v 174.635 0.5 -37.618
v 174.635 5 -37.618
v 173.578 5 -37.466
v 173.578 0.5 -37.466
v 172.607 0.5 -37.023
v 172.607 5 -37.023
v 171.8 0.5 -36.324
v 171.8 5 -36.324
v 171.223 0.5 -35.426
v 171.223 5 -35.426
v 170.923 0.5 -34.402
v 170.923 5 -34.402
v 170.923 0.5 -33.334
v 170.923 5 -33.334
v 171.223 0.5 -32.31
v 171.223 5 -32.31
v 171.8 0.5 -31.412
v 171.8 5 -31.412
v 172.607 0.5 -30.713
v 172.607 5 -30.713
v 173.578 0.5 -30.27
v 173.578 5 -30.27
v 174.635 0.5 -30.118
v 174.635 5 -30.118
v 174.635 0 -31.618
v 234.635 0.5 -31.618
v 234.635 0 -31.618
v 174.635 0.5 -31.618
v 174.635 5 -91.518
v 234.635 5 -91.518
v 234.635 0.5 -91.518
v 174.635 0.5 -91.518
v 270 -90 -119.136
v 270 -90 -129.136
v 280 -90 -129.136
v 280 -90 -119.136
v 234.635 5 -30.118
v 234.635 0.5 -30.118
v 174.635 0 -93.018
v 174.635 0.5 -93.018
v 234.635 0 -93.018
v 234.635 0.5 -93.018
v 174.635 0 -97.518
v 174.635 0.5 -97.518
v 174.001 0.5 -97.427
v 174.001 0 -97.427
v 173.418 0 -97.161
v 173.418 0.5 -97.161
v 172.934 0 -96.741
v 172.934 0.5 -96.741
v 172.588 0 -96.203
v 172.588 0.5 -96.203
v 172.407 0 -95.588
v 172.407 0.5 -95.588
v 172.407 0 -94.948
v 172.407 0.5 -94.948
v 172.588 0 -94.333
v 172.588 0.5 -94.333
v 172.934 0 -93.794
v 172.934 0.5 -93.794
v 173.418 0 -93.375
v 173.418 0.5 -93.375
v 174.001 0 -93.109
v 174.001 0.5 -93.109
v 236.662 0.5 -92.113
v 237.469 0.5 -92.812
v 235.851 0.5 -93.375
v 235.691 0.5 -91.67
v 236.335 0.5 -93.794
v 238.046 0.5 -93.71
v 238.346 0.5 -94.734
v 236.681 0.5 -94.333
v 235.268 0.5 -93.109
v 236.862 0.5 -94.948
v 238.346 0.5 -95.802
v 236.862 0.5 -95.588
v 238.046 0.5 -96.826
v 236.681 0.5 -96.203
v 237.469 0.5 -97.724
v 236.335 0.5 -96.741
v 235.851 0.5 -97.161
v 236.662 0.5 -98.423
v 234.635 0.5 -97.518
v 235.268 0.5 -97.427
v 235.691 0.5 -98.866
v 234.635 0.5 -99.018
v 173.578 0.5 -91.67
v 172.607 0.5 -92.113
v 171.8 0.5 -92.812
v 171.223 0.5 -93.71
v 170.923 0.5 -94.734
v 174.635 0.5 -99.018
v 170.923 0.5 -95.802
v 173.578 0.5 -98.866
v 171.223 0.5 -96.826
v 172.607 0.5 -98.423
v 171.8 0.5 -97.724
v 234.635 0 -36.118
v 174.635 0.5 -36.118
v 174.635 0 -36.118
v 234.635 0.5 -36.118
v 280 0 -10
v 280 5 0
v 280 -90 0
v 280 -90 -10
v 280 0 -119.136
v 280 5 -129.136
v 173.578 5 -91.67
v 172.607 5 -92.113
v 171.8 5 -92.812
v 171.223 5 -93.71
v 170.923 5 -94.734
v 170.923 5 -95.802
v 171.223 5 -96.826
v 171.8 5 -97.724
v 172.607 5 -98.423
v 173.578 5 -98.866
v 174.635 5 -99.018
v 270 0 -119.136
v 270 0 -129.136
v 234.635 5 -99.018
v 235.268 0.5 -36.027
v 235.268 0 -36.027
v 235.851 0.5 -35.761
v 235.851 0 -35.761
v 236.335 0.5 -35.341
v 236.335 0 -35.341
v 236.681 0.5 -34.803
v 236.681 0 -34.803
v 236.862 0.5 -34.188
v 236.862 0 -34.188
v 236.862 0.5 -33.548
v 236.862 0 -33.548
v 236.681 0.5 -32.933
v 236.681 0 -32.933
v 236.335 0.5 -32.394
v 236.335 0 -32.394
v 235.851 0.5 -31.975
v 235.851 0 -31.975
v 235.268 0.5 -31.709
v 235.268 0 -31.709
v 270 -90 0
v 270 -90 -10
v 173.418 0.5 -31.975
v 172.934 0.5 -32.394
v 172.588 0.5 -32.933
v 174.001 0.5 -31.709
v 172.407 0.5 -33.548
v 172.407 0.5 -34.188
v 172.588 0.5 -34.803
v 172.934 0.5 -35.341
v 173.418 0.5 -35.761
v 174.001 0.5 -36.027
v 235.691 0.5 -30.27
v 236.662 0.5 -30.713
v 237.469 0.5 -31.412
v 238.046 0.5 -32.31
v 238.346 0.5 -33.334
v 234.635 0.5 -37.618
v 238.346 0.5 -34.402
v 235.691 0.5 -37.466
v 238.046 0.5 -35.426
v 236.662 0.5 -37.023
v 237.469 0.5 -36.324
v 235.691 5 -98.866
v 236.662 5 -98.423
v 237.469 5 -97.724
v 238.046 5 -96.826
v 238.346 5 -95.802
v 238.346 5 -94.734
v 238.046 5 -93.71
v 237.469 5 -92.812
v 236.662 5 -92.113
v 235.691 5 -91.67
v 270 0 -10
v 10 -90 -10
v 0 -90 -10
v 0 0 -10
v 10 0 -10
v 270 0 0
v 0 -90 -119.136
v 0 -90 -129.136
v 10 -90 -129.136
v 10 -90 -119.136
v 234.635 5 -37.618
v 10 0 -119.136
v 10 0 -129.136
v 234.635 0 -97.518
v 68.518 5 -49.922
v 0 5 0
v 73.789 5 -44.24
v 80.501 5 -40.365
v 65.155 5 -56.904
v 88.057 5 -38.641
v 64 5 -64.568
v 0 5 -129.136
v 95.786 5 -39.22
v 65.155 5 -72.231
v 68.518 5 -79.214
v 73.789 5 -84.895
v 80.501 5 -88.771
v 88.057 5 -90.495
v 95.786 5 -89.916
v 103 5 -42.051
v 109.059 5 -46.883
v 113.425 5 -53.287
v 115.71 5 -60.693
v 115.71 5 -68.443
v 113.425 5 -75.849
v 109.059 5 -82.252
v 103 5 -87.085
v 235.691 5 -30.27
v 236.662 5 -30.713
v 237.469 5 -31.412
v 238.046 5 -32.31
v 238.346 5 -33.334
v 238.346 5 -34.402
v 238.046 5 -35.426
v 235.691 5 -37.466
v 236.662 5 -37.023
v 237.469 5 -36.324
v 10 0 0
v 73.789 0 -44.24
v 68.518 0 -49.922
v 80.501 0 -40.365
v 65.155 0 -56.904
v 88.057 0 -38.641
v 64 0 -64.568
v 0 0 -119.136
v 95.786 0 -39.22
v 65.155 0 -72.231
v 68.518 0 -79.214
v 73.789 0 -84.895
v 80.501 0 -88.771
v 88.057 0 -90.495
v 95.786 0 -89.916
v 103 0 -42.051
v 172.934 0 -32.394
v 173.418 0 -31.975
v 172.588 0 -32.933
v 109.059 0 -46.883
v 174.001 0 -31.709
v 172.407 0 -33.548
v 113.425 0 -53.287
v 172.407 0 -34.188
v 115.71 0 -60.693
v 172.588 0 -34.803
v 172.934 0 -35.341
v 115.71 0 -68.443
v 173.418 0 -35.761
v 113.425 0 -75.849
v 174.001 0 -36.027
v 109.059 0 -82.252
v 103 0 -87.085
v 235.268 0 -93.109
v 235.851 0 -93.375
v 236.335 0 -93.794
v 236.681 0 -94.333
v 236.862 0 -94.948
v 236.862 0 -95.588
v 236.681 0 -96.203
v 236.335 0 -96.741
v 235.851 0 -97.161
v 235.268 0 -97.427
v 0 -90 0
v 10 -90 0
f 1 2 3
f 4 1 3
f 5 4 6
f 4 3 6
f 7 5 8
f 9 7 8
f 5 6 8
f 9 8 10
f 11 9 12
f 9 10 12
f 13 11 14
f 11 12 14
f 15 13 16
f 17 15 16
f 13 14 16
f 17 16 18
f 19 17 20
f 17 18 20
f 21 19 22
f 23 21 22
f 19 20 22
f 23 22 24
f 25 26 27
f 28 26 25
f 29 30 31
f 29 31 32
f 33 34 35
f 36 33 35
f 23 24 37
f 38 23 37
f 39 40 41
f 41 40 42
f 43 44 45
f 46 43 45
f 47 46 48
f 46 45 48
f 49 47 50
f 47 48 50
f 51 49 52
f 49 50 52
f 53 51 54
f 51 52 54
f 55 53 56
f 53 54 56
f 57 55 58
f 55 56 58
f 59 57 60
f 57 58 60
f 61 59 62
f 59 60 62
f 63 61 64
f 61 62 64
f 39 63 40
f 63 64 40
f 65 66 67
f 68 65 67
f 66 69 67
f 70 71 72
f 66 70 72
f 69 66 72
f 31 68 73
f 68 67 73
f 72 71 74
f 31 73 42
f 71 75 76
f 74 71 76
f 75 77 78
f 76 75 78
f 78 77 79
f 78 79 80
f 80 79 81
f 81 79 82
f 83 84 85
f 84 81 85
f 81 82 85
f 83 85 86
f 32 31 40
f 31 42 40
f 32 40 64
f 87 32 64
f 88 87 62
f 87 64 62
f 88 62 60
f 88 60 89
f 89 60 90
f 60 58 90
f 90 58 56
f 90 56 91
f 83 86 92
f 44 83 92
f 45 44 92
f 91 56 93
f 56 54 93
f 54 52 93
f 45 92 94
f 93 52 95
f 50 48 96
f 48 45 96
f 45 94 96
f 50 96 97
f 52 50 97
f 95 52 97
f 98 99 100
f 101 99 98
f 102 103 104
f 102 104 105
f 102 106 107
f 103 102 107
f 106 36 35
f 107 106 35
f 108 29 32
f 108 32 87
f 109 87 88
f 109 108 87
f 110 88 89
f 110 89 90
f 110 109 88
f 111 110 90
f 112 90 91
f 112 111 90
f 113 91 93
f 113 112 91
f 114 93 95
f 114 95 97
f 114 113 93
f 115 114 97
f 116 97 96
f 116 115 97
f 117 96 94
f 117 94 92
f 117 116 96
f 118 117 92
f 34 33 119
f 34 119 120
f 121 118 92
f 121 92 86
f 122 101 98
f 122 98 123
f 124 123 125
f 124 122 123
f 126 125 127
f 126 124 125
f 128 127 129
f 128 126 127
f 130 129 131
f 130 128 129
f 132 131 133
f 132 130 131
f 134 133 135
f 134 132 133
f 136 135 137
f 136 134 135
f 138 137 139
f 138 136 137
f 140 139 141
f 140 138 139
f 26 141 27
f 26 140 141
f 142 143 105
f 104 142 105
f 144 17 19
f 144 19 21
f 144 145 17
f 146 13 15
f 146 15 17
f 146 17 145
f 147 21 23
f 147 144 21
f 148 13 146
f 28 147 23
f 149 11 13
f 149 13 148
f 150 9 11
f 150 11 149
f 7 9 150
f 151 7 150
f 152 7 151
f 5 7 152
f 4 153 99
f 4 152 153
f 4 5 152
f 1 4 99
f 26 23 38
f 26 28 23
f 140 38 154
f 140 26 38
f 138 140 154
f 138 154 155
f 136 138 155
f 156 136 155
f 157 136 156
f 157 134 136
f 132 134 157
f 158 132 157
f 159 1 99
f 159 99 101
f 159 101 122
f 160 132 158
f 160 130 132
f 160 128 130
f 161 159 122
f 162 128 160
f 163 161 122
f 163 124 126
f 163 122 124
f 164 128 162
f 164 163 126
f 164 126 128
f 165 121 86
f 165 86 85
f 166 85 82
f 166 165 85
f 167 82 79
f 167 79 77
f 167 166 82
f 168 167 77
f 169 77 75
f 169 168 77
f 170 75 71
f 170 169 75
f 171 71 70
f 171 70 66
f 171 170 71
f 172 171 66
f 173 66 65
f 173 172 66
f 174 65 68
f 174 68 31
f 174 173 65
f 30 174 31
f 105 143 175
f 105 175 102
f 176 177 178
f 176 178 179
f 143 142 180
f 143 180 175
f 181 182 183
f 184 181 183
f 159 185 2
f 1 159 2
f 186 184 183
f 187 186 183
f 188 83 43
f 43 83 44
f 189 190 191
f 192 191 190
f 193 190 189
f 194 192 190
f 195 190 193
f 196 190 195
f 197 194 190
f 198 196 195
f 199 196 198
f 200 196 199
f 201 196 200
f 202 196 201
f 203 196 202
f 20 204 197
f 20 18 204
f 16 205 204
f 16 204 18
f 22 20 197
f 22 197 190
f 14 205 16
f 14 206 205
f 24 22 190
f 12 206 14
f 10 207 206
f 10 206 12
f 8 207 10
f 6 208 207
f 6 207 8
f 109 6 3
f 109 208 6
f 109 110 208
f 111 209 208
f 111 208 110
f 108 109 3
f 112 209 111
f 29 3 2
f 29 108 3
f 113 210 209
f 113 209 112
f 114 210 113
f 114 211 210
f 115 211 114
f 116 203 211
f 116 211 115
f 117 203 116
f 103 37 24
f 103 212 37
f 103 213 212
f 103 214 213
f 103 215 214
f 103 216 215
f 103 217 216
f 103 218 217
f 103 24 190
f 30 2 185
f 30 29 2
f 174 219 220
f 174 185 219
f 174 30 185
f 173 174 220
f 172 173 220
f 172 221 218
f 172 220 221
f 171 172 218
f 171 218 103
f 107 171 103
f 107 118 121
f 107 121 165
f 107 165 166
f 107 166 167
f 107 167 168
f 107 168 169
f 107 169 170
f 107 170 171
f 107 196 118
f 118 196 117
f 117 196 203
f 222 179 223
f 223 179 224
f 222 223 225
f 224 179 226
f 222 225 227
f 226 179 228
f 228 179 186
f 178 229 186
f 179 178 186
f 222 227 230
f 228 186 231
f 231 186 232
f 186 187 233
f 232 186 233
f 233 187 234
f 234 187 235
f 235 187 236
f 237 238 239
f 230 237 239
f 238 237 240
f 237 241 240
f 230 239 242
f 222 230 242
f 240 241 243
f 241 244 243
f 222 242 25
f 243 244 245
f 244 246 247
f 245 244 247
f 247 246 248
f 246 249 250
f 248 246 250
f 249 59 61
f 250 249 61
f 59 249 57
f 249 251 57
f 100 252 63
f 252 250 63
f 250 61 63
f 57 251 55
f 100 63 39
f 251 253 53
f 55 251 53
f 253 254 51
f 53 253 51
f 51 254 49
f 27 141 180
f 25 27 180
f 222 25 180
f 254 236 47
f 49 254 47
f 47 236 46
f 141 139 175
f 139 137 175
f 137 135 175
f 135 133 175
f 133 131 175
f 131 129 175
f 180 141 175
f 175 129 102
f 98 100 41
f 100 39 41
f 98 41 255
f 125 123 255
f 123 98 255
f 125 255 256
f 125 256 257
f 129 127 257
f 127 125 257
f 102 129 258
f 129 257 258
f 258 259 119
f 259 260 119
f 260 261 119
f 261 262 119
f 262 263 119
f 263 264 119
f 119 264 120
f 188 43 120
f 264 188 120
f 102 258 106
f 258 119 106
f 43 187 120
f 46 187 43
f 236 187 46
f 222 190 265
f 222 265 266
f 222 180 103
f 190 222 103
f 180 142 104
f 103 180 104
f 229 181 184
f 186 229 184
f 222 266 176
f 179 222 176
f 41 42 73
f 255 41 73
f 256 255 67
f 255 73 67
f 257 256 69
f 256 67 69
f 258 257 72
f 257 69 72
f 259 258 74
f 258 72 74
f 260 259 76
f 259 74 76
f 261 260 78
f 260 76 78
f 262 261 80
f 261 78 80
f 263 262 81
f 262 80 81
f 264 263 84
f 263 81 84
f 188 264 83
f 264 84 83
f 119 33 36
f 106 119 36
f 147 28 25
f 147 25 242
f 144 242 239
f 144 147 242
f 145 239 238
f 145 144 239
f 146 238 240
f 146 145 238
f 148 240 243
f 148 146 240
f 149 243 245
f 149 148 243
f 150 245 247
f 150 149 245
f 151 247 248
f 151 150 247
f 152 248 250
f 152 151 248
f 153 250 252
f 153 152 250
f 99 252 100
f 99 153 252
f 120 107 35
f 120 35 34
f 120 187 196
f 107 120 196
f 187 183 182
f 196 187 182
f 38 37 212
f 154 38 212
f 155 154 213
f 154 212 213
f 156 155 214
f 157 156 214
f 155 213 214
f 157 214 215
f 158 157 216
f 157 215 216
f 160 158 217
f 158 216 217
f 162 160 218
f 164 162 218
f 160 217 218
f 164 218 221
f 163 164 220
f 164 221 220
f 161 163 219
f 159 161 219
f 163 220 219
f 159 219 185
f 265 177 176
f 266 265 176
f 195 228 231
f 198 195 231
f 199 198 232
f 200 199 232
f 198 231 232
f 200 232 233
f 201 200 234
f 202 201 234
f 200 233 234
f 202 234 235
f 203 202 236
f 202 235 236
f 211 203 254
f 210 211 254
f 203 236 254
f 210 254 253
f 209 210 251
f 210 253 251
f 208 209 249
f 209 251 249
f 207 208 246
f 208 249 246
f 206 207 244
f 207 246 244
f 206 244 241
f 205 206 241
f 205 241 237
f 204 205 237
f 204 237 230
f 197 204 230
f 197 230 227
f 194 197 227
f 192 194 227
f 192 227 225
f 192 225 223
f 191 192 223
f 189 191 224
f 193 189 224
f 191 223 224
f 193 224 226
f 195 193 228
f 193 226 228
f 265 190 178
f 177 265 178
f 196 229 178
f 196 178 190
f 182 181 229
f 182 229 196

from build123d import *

# Parameters (mm, degrees)
SZKIC1_R                         = 26
DODANIE_WYCI_GNI_CIE1_DEPTH      = 5
DODANIE_WYCI_GNI_CIE2_DEPTH      = 5
DODANIE_WYCI_GNI_CIE2_DEPTH_BACK = 90
SZKIC1_3_W                       = 10
SZKIC1_3_H                       = 10
WYTNIJ_WYCI_GNI_CIE1_DEPTH       = 323.646908993
WYTNIJ_WYCI_GNI_CIE2_DEPTH       = 4.5


with BuildPart() as part:
    # Szkic1 → Dodanie-wyciągnięcie1 (new body)
    with BuildSketch(Plane(origin=(0, 0, 0), x_dir=(1, 0, 0), z_dir=(0, 1, 0))):
        Polygon((10, 10), (10, 0), (270, 0), (270, 10), (280, 10), (280, 119.135695619), (270, 119.135695619), (270, 129.135695619), (10, 129.135695619), (10, 119.135695619), (0, 119.135695619), (0, 10), align=None)
        with Locations((90, 64.567847809)):
            Circle(SZKIC1_R, mode=Mode.SUBTRACT)
    extrude(amount=DODANIE_WYCI_GNI_CIE1_DEPTH)

    # Szkic1<3> → Dodanie-wyciągnięcie2 (add, two sides: drawn at the far end of the back side and taken through both)
    with BuildSketch(Plane(origin=(0, 0, 0), x_dir=(1, 0, 0), z_dir=(0, 1, 0)).offset(-DODANIE_WYCI_GNI_CIE2_DEPTH_BACK)):
        with Locations((5, 5)):
            Rectangle(SZKIC1_3_W, SZKIC1_3_H)
        with Locations((275, 5)):
            Rectangle(SZKIC1_3_W, SZKIC1_3_H)
        with Locations((5, 124.135695619)):
            Rectangle(SZKIC1_3_W, SZKIC1_3_H)
        with Locations((275, 124.135695619)):
            Rectangle(SZKIC1_3_W, SZKIC1_3_H)
    extrude(amount=DODANIE_WYCI_GNI_CIE2_DEPTH + DODANIE_WYCI_GNI_CIE2_DEPTH_BACK)

    # Szkic2 → Wytnij-wyciągnięcie1 (cut, through all)
    with BuildSketch(Plane(origin=(0, 5, 0), x_dir=(1, 0, 0), z_dir=(0, 1, 0))):
        with BuildLine():
            Line((234.634543985, 97.517847809), (174.634543985, 97.517847809))
            ThreePointArc((174.634543985, 97.517847809), (172.384543985, 95.267847809), (174.634543985, 93.017847809))
            Line((174.634543985, 93.017847809), (234.634543985, 93.017847809))
            ThreePointArc((234.634543985, 93.017847809), (236.884543985, 95.267847809), (234.634543985, 97.517847809))
        make_face()
        with BuildLine():
            ThreePointArc((174.634543985, 36.117847809), (172.384543985, 33.867847809), (174.634543985, 31.617847809))
            Line((174.634543985, 31.617847809), (234.634543985, 31.617847809))
            ThreePointArc((234.634543985, 31.617847809), (236.884543985, 33.867847809), (234.634543985, 36.117847809))
            Line((234.634543985, 36.117847809), (174.634543985, 36.117847809))
        make_face()
    extrude(amount=-WYTNIJ_WYCI_GNI_CIE1_DEPTH, mode=Mode.SUBTRACT)

    # Szkic2<3> → Wytnij-wyciągnięcie2 (cut)
    # profile 1 of 2: a face of its own
    with BuildSketch(Plane(origin=(0, 5, 0), x_dir=(1, 0, 0), z_dir=(0, 1, 0))):
        with BuildLine():
            Line((174.634543985, 99.017847809), (234.634543985, 99.017847809))
            ThreePointArc((234.634543985, 99.017847809), (238.384543985, 95.267847809), (234.634543985, 91.517847809))
            Line((234.634543985, 91.517847809), (174.634543985, 91.517847809))
            ThreePointArc((174.634543985, 91.517847809), (170.884543985, 95.267847809), (174.634543985, 99.017847809))
        make_face()
        with BuildLine():
            Line((174.634543985, 97.517847809), (234.634543985, 97.517847809))
            ThreePointArc((234.634543985, 97.517847809), (236.884543985, 95.267847809), (234.634543985, 93.017847809))
            Line((234.634543985, 93.017847809), (174.634543985, 93.017847809))
            ThreePointArc((174.634543985, 93.017847809), (172.384543985, 95.267847809), (174.634543985, 97.517847809))
        make_face(mode=Mode.SUBTRACT)
    # profile 2 of 2: a face of its own
    with BuildSketch(Plane(origin=(0, 5, 0), x_dir=(1, 0, 0), z_dir=(0, 1, 0))):
        with BuildLine():
            Line((174.634543985, 30.117847809), (234.634543985, 30.117847809))
            ThreePointArc((234.634543985, 30.117847809), (238.384543985, 33.867847809), (234.634543985, 37.617847809))
            Line((234.634543985, 37.617847809), (174.634543985, 37.617847809))
            ThreePointArc((174.634543985, 37.617847809), (170.884543985, 33.867847809), (174.634543985, 30.117847809))
        make_face()
        with BuildLine():
            Line((174.634543985, 31.617847809), (234.634543985, 31.617847809))
            ThreePointArc((234.634543985, 31.617847809), (236.884543985, 33.867847809), (234.634543985, 36.117847809))
            Line((234.634543985, 36.117847809), (174.634543985, 36.117847809))
            ThreePointArc((174.634543985, 36.117847809), (172.384543985, 33.867847809), (174.634543985, 31.617847809))
        make_face(mode=Mode.SUBTRACT)
    extrude(amount=-WYTNIJ_WYCI_GNI_CIE2_DEPTH, mode=Mode.SUBTRACT)


solid = part.part
